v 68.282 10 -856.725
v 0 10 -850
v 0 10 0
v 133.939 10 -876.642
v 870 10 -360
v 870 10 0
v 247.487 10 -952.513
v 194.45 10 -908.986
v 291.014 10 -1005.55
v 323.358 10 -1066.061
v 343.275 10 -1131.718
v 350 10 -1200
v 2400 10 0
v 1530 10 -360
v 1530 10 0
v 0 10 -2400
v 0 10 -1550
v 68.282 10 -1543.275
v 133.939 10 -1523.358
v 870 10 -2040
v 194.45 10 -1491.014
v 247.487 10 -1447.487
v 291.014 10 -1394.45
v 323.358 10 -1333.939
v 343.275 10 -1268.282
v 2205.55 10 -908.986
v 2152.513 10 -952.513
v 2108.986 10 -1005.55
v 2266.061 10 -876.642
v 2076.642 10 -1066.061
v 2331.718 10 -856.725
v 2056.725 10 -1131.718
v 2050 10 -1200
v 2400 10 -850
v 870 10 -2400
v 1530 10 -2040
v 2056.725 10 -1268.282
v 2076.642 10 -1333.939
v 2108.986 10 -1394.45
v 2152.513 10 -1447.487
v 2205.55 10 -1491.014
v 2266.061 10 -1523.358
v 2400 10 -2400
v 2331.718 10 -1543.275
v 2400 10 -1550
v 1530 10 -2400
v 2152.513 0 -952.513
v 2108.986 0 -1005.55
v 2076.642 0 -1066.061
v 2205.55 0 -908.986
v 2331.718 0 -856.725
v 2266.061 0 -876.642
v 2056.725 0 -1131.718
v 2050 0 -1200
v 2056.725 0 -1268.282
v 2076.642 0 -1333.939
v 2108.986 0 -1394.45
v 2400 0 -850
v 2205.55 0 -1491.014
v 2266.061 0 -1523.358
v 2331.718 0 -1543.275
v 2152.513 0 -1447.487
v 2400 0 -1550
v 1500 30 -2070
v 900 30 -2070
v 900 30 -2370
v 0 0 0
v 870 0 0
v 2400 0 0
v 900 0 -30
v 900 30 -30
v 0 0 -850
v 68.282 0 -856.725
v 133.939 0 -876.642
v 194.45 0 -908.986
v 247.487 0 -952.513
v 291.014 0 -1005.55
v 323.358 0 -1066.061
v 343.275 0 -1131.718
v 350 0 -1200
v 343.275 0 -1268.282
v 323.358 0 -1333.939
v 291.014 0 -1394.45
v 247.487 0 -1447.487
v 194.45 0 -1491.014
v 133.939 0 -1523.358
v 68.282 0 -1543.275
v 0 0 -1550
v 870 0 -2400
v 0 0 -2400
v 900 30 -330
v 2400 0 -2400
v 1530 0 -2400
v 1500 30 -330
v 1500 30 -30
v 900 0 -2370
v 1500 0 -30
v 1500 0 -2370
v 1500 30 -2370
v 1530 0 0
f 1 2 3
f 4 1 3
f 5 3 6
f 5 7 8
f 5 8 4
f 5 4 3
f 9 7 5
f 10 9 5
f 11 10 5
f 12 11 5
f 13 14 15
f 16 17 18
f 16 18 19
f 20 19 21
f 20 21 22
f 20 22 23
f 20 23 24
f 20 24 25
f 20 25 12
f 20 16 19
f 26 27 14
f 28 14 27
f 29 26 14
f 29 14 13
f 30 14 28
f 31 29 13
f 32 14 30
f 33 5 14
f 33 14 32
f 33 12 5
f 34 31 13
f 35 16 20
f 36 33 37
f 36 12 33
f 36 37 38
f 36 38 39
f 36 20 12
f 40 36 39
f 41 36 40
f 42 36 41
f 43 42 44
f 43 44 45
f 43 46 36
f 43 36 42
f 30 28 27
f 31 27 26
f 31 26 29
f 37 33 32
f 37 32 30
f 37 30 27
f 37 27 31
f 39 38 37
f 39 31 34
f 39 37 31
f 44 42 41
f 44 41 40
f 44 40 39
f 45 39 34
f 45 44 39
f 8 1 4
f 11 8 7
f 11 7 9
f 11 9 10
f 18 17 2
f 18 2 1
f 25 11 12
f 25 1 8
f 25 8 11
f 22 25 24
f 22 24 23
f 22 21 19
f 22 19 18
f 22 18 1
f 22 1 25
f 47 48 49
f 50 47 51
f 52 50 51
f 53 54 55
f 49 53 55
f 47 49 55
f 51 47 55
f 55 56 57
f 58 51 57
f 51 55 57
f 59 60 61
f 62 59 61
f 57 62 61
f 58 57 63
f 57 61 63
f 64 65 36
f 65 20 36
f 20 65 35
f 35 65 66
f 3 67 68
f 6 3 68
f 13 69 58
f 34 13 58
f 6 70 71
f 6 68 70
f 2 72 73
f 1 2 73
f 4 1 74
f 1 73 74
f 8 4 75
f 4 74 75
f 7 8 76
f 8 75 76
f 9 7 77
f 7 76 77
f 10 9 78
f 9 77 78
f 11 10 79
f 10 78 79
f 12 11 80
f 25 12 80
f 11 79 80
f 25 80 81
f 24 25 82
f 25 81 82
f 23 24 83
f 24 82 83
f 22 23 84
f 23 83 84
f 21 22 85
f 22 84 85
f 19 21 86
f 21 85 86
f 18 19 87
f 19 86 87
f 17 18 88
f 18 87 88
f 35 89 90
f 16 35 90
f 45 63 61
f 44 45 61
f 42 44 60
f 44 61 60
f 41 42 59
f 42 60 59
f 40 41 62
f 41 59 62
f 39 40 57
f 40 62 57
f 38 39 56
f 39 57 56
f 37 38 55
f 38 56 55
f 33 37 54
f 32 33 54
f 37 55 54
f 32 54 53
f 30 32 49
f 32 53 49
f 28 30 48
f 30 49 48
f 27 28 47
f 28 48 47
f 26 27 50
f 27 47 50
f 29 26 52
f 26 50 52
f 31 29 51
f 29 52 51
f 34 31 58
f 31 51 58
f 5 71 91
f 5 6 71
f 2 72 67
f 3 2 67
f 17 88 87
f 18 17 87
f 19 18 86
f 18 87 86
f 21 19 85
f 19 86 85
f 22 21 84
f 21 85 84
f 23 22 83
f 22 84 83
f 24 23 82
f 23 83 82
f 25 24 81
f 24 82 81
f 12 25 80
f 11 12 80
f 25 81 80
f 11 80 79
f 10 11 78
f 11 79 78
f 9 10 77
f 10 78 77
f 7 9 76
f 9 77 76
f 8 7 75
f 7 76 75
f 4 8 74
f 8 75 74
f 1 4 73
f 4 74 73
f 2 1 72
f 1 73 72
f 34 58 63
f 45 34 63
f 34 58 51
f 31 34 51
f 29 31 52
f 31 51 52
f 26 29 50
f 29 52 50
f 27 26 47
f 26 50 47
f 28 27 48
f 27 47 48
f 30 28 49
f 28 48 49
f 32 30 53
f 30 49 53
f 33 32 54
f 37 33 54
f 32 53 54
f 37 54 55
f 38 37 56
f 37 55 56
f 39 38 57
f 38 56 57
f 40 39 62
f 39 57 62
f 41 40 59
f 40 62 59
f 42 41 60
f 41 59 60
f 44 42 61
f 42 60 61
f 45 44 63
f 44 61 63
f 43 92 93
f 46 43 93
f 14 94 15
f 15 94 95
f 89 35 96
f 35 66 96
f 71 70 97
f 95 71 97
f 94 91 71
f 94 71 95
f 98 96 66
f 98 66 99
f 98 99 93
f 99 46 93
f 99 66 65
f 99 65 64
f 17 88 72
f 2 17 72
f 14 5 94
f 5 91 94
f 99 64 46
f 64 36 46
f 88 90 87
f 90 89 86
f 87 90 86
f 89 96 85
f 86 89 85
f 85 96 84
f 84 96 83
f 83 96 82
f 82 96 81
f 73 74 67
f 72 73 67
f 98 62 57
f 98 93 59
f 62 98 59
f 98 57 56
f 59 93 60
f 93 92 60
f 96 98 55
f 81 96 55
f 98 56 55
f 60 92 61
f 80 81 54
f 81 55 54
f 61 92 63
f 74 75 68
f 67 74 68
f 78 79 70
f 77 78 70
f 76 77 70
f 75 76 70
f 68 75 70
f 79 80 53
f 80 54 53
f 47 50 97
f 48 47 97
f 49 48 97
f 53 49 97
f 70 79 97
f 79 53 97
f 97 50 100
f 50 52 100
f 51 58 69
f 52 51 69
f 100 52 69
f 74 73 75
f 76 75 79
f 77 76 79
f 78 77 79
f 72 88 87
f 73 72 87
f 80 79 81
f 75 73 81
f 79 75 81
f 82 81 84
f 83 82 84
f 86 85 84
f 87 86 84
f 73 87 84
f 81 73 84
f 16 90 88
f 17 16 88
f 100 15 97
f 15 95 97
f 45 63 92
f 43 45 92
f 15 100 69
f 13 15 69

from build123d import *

# Parameters (mm, degrees)
EXTRUDE_18_DEPTH = 10
EXTRUDE_21_DEPTH = 10
EXTRUDE_22_DEPTH = 10
SKETCH_1_27_W    = 600
SKETCH_1_27_H    = 300
EXTRUDE_24_DEPTH = 30
SKETCH_1_28_W    = 600
SKETCH_1_28_H    = 300
EXTRUDE_25_DEPTH = 30


with BuildPart() as part:
    # 草图1<20> → 凸台-拉伸18 (new body)
    with BuildSketch(Plane(origin=(0, 0, 0), x_dir=(1, 0, 0), z_dir=(0, 1, 0))):
        with BuildLine():
            Line((0, 850), (0, 0))
            Line((0, 0), (870, 0))
            Line((870, 0), (870, 360))
            Line((870, 360), (1530, 360))
            Line((1530, 360), (1530, 0))
            Line((1530, 0), (2400, 0))
            Line((2400, 0), (2400, 850))
            ThreePointArc((2400, 850), (2050, 1200), (2400, 1550))
            Line((2400, 1550), (2400, 2400))
            Line((2400, 2400), (1530, 2400))
            Line((1530, 2400), (1530, 2040))
            Line((1530, 2040), (870, 2040))
            Line((870, 2040), (870, 2400))
            Line((870, 2400), (0, 2400))
            Line((0, 2400), (0, 1550))
            ThreePointArc((0, 1550), (350, 1200), (0, 850))
        make_face()
    extrude(amount=EXTRUDE_18_DEPTH)



with BuildPart() as body_2:
    # 草图1<23> → 凸台-拉伸21 (new body)
    with BuildSketch(Plane(origin=(0, 0, 0), x_dir=(1, 0, 0), z_dir=(0, 1, 0))):
        with BuildLine():
            Line((0, 1550), (0, 850))
            ThreePointArc((0, 850), (350, 1200), (0, 1550))
        make_face()
    extrude(amount=EXTRUDE_21_DEPTH)


with BuildPart() as body_3:
    # 草图1 → 凸台-拉伸22 (new body)
    with BuildSketch(Plane(origin=(0, 0, 0), x_dir=(1, 0, 0), z_dir=(0, 1, 0))):
        with BuildLine():
            ThreePointArc((2400, 1550), (2050, 1200), (2400, 850))
            Line((2400, 850), (2400, 1550))
        make_face()
    extrude(amount=EXTRUDE_22_DEPTH)


with BuildPart() as body_4:
    # 草图1<27> → 凸台-拉伸24 (new body)
    with BuildSketch(Plane(origin=(0, 0, 0), x_dir=(1, 0, 0), z_dir=(0, 1, 0))):
        with Locations((1200, 180)):
            Rectangle(SKETCH_1_27_W, SKETCH_1_27_H)
    extrude(amount=EXTRUDE_24_DEPTH)


with BuildPart() as part_1:
    add(part.part)

    add(body_4.part)  # loft_6 joins it to this body
    # loft from a face of the part (loft_6)
    loft([part_1.faces().sort_by_distance((1530, 5, -180))[0], part_1.faces().sort_by_distance((1500, 15, -180))[0]])

    # loft from a face of the part (loft_7)
    loft([part_1.faces().sort_by_distance((900, 15, -180))[0], part_1.faces().sort_by_distance((870, 5, -180))[0]])

    # loft from a face of the part (loft_8)
    loft([part_1.faces().sort_by_distance((1200, 5, -360))[0], part_1.faces().sort_by_distance((1200, 15, -330))[0]])



with BuildPart() as body_4_2:
    # 草图1<28> → 凸台-拉伸25 (new body)
    with BuildSketch(Plane(origin=(0, 0, 0), x_dir=(1, 0, 0), z_dir=(0, 1, 0))):
        with Locations((1200, 2220)):
            Rectangle(SKETCH_1_28_W, SKETCH_1_28_H)
    extrude(amount=EXTRUDE_25_DEPTH)


with BuildPart() as part_2:
    add(part_1.part)

    add(body_4_2.part)  # loft_9 joins it to this body
    # loft from a face of the part (loft_9)
    loft([part_2.faces().sort_by_distance((870, 5, -2220))[0], part_2.faces().sort_by_distance((900, 15, -2220))[0]])

    # loft from a face of the part (loft_10)
    loft([part_2.faces().sort_by_distance((1200, 15, -2070))[0], part_2.faces().sort_by_distance((1200, 5, -2040))[0]])

    # loft from a face of the part (loft_11)
    loft([part_2.faces().sort_by_distance((1500, 15, -2220))[0], part_2.faces().sort_by_distance((1530, 5, -2220))[0]])


solid = Compound([body_2.part, body_3.part, part_2.part])
